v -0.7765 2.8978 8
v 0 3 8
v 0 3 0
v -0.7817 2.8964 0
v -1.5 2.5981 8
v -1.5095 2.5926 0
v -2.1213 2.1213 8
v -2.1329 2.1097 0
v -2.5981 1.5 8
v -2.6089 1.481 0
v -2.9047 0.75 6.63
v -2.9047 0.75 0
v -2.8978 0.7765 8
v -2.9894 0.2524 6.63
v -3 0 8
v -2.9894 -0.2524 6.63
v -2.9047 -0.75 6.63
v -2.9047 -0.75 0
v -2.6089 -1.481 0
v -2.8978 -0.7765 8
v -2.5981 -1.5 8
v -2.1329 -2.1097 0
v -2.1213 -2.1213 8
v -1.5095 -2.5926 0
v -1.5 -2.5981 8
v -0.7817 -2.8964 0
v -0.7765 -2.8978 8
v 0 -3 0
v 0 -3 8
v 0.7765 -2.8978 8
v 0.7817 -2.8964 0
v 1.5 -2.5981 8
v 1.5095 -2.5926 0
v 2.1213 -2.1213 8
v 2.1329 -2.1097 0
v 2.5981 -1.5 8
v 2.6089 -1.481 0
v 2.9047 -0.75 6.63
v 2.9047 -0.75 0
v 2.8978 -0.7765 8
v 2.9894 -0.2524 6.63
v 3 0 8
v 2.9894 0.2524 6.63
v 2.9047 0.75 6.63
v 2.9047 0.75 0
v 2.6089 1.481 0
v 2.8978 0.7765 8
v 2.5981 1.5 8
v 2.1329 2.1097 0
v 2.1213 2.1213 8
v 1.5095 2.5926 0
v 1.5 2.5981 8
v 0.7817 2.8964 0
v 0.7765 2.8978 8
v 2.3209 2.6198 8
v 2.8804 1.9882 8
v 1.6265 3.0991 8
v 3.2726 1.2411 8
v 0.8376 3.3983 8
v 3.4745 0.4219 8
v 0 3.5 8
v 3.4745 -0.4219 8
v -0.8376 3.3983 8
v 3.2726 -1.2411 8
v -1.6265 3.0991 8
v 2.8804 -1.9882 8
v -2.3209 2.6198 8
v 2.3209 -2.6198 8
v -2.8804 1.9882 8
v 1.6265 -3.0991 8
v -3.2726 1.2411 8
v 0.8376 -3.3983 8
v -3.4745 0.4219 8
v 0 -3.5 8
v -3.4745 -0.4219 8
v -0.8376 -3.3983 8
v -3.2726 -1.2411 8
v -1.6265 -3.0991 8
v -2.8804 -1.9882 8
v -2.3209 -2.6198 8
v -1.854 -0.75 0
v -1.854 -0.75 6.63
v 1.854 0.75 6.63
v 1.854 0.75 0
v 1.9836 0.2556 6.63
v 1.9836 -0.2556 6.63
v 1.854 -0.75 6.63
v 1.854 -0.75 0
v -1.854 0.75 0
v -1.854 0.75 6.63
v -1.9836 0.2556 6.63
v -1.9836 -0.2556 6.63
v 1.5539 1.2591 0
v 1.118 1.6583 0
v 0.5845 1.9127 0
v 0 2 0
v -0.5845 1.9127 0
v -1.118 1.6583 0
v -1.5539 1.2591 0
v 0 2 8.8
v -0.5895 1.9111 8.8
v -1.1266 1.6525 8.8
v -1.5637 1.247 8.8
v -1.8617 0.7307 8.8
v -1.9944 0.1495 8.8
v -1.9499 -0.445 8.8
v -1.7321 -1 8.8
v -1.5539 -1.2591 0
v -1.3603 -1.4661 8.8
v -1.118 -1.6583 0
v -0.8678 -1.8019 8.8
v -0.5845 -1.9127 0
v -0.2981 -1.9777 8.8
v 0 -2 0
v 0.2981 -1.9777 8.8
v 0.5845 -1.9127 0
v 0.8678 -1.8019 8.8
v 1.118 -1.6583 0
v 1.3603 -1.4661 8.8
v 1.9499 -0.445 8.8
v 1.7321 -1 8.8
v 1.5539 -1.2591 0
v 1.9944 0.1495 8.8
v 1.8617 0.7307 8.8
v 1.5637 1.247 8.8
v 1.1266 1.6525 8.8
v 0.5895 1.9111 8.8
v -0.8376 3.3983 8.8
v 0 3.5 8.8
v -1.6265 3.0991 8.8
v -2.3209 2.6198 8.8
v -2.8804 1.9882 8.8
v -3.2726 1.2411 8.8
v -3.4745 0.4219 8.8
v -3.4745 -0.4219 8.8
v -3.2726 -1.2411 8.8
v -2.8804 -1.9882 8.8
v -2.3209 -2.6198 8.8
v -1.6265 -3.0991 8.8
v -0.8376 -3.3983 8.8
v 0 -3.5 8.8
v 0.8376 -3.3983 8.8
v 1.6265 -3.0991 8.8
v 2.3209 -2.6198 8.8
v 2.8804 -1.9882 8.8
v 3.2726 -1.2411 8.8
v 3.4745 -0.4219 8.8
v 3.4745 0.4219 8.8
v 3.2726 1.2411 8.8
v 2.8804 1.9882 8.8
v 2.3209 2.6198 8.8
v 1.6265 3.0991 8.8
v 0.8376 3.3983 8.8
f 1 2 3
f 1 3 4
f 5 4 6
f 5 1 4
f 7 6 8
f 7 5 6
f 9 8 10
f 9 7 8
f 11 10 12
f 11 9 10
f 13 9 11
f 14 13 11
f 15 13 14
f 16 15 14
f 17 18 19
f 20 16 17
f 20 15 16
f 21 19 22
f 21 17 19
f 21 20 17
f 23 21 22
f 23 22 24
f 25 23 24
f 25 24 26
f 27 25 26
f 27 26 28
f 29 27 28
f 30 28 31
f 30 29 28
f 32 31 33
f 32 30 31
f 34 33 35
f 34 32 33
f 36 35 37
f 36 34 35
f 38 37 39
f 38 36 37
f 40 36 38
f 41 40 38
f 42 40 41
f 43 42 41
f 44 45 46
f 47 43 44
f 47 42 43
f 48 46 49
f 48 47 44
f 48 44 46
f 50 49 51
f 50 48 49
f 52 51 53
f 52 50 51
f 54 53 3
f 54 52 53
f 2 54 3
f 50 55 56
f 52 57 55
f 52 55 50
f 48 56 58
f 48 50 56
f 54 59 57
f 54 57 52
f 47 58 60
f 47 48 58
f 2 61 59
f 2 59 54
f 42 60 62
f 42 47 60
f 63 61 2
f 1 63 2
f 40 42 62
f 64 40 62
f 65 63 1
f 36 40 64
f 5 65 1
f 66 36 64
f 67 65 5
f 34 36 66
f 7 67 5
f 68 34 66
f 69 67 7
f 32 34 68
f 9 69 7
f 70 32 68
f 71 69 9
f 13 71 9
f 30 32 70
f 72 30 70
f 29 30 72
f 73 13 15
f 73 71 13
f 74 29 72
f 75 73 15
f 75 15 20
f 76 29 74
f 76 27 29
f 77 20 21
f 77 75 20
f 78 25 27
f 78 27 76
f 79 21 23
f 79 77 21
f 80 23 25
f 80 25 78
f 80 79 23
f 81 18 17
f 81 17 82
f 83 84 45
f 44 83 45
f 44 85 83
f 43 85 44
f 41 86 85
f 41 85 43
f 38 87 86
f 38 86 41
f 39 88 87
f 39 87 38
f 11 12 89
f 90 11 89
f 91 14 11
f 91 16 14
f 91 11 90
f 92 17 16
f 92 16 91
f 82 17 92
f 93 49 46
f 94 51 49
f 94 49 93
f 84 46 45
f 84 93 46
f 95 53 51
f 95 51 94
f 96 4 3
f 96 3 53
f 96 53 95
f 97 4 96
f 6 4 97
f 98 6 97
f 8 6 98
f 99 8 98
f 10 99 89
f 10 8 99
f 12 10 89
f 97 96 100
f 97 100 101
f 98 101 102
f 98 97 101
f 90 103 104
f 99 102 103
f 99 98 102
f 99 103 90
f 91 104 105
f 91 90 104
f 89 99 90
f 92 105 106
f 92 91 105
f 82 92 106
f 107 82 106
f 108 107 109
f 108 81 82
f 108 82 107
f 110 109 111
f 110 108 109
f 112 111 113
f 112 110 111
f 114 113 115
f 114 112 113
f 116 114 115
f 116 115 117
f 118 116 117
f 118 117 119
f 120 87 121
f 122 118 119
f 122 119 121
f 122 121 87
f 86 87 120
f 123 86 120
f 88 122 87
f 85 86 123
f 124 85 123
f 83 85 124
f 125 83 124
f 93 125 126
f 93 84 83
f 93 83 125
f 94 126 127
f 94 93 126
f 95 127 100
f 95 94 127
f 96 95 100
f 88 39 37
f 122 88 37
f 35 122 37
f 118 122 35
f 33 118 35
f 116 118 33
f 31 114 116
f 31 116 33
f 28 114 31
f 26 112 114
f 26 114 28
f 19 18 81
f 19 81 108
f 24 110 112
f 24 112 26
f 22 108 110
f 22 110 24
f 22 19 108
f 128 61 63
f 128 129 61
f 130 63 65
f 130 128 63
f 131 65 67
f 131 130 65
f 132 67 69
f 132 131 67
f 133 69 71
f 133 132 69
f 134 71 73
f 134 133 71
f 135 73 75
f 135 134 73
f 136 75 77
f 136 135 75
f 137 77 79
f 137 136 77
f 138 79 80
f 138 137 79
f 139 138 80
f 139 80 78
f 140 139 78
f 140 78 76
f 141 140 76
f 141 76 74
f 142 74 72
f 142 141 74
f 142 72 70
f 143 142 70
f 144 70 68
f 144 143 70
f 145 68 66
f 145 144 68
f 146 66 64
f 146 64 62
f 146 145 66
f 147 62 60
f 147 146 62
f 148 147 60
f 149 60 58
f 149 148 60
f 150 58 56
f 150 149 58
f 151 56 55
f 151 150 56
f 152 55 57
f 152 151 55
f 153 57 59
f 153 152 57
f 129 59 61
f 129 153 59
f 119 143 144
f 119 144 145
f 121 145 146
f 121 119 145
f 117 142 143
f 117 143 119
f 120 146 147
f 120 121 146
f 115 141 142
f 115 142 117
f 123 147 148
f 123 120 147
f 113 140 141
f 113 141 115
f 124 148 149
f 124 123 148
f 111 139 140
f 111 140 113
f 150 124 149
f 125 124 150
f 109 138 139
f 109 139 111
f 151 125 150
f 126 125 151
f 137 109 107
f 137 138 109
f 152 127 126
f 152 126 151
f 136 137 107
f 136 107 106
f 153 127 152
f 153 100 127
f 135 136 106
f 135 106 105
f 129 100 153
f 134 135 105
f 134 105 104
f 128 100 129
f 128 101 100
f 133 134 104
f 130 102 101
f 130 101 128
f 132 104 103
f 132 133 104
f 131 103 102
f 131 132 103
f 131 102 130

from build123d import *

# Parameters (mm, degrees)
F2_W     = 8
F2_H     = 1.5
F3_DEPTH = 6.63


with BuildPart() as f1:
    # F0 (on Right) → F1 (revolve)
    with BuildSketch(Plane.YZ):
        Polygon((2, 8.8), (2, 0), (3, 0), (3, 8), (3.5, 8), (3.5, 8.8), align=None)
    revolve(axis=Axis((0, 0, 4.285715), (0, 0, 1)))

    # F2 (on face) → F3 (cut)
    with BuildSketch(Plane(origin=(0, 0, 0), x_dir=(1, 0, 0), z_dir=(0, 0, -1))):
        Rectangle(F2_W, F2_H)
    extrude(amount=-F3_DEPTH, mode=Mode.SUBTRACT)


solid = f1.part
